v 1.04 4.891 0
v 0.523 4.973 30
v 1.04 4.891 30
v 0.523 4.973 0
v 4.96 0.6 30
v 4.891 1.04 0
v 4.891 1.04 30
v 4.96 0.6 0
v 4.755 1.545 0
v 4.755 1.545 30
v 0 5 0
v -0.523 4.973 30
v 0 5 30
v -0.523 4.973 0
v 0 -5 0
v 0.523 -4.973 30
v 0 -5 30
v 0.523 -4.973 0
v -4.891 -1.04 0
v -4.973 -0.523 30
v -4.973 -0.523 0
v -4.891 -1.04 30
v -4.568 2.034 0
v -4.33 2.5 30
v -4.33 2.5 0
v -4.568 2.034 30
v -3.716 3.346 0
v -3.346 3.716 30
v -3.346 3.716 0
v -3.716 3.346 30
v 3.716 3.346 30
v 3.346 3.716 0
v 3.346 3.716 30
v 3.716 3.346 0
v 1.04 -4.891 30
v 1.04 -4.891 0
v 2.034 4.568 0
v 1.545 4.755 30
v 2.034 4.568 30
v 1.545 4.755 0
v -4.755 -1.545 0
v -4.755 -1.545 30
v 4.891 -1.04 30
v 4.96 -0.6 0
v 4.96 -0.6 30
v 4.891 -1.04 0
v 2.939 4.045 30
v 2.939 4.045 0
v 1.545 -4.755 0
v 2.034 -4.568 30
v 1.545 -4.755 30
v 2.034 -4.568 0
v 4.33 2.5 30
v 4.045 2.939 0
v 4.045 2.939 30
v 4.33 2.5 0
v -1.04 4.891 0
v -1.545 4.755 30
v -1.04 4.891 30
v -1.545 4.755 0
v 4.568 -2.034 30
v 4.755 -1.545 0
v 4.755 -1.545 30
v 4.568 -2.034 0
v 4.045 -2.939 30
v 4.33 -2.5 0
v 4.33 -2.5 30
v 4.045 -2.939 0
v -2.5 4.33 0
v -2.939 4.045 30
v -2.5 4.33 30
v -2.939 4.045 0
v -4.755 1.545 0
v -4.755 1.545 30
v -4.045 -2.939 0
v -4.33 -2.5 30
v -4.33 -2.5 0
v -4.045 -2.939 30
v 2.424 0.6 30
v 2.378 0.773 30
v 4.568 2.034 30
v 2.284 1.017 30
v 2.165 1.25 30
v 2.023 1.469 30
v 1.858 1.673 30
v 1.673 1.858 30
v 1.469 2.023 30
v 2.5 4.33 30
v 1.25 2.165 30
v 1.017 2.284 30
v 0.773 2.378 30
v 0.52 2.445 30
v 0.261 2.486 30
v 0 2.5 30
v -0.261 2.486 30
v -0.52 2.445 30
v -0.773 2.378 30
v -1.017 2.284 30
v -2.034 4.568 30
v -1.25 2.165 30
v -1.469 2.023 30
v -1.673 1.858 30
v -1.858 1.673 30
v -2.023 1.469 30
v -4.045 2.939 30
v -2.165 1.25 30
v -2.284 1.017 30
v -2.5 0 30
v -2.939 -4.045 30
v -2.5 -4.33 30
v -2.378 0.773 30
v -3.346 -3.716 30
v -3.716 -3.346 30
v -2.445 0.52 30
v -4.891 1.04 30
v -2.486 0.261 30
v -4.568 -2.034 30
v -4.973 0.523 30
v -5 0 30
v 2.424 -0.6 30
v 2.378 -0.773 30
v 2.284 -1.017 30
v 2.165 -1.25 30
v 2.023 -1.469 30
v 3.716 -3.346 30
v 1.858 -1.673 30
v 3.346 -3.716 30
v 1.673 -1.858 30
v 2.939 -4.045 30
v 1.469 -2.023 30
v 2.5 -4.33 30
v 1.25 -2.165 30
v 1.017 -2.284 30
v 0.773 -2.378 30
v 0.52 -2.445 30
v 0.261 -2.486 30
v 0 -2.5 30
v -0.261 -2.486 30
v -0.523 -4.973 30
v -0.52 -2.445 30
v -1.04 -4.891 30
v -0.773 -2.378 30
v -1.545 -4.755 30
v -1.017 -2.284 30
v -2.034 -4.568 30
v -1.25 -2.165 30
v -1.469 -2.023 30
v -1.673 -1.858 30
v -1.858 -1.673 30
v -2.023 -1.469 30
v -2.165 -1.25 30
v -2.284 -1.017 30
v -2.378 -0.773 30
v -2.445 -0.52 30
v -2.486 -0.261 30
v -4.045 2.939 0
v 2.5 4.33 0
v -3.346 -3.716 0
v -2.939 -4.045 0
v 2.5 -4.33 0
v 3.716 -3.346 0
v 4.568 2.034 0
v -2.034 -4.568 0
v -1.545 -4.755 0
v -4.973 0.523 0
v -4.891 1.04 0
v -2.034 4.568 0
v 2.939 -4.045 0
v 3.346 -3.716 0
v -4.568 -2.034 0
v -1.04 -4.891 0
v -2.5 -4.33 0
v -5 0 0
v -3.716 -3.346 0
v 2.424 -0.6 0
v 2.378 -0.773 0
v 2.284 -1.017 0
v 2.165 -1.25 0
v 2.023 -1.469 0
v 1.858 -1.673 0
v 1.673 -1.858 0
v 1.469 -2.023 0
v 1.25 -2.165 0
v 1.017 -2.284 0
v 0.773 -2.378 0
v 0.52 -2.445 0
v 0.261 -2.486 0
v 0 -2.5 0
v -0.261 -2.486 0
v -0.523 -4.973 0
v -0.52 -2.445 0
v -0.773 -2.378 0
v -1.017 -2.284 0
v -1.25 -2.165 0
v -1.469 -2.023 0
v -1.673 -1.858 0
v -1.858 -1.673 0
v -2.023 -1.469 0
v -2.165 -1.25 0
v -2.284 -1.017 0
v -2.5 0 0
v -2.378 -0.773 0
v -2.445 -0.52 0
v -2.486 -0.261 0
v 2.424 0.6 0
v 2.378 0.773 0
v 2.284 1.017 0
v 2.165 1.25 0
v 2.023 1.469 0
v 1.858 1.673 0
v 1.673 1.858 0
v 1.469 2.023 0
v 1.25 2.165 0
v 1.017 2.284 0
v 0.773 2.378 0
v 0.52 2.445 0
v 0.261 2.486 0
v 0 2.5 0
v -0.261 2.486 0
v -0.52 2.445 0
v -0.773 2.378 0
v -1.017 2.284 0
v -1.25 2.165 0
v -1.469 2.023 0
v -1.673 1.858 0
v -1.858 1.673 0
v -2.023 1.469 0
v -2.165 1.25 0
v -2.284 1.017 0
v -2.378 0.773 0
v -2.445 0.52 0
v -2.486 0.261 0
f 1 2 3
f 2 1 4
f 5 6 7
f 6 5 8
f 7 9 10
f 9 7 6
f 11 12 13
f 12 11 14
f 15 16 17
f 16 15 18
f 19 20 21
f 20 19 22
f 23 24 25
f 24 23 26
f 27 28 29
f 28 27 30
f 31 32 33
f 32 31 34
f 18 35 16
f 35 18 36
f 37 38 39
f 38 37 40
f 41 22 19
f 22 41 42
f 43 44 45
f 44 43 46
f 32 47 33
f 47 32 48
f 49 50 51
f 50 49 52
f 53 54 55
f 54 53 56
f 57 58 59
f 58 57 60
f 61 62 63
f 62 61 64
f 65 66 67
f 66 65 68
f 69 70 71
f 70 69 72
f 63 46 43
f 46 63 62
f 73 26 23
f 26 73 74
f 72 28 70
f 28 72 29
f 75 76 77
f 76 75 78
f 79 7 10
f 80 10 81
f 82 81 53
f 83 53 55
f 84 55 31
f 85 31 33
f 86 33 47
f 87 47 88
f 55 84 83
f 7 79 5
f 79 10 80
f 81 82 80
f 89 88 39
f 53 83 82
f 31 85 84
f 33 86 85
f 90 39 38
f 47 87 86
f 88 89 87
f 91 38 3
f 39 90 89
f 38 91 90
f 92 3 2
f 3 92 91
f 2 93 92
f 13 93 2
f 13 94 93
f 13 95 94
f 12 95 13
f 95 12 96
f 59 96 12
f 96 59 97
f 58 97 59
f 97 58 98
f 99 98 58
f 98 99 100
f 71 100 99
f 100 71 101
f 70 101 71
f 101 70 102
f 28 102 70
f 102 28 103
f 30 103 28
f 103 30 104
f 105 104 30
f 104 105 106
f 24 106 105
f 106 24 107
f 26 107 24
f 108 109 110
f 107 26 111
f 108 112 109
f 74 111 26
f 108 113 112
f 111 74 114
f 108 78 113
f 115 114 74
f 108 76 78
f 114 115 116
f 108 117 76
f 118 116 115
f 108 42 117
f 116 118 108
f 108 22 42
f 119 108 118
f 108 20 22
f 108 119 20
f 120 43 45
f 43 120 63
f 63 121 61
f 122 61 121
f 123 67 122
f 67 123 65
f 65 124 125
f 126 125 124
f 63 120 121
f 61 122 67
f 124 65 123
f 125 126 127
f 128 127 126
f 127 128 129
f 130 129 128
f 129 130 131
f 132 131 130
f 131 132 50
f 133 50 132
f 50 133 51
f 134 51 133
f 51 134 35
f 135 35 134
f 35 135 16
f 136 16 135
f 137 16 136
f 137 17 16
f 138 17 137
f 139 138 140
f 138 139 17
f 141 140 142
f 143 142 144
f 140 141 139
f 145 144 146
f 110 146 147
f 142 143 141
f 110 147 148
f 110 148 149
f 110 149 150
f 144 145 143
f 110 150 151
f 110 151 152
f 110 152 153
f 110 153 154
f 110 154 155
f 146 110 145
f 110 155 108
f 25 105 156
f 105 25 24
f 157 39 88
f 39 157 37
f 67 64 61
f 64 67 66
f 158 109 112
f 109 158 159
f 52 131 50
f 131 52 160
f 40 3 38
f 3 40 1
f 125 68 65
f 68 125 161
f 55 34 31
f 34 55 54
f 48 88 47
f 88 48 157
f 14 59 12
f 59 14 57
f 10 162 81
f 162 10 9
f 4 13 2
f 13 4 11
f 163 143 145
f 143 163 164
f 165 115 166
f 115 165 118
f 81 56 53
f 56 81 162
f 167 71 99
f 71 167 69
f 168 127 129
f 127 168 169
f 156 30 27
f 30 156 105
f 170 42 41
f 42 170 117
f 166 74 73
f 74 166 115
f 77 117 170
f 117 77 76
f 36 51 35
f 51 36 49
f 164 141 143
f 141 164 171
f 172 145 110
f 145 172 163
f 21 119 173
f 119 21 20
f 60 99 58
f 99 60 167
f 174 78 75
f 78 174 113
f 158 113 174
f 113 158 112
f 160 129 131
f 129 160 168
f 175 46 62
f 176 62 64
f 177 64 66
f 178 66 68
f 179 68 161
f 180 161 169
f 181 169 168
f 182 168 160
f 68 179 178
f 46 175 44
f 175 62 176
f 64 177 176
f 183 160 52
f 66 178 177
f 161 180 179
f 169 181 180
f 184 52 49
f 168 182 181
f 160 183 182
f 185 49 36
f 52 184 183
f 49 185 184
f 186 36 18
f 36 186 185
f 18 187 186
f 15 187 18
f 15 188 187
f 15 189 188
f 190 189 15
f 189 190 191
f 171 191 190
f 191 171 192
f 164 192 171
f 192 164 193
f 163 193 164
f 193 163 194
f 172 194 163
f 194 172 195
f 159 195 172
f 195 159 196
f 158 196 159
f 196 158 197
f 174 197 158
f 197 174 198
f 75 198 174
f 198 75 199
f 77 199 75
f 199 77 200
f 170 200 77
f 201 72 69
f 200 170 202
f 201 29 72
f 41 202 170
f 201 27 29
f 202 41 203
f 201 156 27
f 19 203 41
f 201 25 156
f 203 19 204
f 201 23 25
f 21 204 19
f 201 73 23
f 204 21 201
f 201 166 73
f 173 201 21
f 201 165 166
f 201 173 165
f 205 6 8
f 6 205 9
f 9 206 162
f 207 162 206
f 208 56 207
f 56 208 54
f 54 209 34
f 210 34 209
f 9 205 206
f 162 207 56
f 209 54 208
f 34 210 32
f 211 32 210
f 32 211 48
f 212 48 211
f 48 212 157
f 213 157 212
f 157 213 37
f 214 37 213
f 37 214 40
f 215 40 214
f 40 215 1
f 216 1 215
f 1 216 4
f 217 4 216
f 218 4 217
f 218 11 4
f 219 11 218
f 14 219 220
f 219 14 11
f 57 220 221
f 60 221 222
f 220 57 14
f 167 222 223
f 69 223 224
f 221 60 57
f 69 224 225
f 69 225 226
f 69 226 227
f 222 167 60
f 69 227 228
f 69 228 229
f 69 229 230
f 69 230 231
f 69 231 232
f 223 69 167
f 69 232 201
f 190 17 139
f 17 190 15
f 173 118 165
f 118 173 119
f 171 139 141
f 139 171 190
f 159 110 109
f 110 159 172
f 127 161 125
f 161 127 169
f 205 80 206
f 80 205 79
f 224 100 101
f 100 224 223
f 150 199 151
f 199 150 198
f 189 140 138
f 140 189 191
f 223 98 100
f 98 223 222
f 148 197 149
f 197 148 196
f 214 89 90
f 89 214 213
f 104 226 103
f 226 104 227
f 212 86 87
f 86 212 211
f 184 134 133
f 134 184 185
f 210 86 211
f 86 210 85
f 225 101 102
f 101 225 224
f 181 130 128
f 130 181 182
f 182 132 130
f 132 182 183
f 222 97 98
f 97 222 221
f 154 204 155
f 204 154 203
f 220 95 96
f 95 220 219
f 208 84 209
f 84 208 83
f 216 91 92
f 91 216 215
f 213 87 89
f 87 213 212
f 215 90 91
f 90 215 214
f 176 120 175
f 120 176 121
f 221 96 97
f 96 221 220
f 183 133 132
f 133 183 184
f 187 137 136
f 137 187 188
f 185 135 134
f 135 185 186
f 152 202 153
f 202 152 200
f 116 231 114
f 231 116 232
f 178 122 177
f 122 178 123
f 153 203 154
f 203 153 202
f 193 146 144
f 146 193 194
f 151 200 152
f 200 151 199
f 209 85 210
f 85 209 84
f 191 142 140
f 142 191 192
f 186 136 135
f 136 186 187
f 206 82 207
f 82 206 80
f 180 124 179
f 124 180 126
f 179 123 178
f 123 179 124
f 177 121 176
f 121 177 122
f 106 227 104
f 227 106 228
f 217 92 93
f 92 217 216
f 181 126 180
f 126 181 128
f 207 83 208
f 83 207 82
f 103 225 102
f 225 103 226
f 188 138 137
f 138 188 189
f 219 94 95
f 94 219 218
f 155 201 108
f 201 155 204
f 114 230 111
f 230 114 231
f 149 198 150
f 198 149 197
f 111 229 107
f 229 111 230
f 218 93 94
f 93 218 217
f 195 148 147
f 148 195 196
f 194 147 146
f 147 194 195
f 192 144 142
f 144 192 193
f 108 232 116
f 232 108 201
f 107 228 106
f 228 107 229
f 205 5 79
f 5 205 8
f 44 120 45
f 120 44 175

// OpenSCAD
// Slotted spring pin sleeve.
$fn = 60;
eps = 0.02;
inner_d = 5;
outer_d = 10;
length = 30;
slot_w = 1.2;
difference() {
    cylinder(d = outer_d, h = length);
    translate([0, 0, -eps]) cylinder(d = inner_d, h = length + 2 * eps);
    translate([0, -slot_w / 2, -eps]) cube([outer_d / 2 + eps, slot_w, length + 2 * eps]);
}
